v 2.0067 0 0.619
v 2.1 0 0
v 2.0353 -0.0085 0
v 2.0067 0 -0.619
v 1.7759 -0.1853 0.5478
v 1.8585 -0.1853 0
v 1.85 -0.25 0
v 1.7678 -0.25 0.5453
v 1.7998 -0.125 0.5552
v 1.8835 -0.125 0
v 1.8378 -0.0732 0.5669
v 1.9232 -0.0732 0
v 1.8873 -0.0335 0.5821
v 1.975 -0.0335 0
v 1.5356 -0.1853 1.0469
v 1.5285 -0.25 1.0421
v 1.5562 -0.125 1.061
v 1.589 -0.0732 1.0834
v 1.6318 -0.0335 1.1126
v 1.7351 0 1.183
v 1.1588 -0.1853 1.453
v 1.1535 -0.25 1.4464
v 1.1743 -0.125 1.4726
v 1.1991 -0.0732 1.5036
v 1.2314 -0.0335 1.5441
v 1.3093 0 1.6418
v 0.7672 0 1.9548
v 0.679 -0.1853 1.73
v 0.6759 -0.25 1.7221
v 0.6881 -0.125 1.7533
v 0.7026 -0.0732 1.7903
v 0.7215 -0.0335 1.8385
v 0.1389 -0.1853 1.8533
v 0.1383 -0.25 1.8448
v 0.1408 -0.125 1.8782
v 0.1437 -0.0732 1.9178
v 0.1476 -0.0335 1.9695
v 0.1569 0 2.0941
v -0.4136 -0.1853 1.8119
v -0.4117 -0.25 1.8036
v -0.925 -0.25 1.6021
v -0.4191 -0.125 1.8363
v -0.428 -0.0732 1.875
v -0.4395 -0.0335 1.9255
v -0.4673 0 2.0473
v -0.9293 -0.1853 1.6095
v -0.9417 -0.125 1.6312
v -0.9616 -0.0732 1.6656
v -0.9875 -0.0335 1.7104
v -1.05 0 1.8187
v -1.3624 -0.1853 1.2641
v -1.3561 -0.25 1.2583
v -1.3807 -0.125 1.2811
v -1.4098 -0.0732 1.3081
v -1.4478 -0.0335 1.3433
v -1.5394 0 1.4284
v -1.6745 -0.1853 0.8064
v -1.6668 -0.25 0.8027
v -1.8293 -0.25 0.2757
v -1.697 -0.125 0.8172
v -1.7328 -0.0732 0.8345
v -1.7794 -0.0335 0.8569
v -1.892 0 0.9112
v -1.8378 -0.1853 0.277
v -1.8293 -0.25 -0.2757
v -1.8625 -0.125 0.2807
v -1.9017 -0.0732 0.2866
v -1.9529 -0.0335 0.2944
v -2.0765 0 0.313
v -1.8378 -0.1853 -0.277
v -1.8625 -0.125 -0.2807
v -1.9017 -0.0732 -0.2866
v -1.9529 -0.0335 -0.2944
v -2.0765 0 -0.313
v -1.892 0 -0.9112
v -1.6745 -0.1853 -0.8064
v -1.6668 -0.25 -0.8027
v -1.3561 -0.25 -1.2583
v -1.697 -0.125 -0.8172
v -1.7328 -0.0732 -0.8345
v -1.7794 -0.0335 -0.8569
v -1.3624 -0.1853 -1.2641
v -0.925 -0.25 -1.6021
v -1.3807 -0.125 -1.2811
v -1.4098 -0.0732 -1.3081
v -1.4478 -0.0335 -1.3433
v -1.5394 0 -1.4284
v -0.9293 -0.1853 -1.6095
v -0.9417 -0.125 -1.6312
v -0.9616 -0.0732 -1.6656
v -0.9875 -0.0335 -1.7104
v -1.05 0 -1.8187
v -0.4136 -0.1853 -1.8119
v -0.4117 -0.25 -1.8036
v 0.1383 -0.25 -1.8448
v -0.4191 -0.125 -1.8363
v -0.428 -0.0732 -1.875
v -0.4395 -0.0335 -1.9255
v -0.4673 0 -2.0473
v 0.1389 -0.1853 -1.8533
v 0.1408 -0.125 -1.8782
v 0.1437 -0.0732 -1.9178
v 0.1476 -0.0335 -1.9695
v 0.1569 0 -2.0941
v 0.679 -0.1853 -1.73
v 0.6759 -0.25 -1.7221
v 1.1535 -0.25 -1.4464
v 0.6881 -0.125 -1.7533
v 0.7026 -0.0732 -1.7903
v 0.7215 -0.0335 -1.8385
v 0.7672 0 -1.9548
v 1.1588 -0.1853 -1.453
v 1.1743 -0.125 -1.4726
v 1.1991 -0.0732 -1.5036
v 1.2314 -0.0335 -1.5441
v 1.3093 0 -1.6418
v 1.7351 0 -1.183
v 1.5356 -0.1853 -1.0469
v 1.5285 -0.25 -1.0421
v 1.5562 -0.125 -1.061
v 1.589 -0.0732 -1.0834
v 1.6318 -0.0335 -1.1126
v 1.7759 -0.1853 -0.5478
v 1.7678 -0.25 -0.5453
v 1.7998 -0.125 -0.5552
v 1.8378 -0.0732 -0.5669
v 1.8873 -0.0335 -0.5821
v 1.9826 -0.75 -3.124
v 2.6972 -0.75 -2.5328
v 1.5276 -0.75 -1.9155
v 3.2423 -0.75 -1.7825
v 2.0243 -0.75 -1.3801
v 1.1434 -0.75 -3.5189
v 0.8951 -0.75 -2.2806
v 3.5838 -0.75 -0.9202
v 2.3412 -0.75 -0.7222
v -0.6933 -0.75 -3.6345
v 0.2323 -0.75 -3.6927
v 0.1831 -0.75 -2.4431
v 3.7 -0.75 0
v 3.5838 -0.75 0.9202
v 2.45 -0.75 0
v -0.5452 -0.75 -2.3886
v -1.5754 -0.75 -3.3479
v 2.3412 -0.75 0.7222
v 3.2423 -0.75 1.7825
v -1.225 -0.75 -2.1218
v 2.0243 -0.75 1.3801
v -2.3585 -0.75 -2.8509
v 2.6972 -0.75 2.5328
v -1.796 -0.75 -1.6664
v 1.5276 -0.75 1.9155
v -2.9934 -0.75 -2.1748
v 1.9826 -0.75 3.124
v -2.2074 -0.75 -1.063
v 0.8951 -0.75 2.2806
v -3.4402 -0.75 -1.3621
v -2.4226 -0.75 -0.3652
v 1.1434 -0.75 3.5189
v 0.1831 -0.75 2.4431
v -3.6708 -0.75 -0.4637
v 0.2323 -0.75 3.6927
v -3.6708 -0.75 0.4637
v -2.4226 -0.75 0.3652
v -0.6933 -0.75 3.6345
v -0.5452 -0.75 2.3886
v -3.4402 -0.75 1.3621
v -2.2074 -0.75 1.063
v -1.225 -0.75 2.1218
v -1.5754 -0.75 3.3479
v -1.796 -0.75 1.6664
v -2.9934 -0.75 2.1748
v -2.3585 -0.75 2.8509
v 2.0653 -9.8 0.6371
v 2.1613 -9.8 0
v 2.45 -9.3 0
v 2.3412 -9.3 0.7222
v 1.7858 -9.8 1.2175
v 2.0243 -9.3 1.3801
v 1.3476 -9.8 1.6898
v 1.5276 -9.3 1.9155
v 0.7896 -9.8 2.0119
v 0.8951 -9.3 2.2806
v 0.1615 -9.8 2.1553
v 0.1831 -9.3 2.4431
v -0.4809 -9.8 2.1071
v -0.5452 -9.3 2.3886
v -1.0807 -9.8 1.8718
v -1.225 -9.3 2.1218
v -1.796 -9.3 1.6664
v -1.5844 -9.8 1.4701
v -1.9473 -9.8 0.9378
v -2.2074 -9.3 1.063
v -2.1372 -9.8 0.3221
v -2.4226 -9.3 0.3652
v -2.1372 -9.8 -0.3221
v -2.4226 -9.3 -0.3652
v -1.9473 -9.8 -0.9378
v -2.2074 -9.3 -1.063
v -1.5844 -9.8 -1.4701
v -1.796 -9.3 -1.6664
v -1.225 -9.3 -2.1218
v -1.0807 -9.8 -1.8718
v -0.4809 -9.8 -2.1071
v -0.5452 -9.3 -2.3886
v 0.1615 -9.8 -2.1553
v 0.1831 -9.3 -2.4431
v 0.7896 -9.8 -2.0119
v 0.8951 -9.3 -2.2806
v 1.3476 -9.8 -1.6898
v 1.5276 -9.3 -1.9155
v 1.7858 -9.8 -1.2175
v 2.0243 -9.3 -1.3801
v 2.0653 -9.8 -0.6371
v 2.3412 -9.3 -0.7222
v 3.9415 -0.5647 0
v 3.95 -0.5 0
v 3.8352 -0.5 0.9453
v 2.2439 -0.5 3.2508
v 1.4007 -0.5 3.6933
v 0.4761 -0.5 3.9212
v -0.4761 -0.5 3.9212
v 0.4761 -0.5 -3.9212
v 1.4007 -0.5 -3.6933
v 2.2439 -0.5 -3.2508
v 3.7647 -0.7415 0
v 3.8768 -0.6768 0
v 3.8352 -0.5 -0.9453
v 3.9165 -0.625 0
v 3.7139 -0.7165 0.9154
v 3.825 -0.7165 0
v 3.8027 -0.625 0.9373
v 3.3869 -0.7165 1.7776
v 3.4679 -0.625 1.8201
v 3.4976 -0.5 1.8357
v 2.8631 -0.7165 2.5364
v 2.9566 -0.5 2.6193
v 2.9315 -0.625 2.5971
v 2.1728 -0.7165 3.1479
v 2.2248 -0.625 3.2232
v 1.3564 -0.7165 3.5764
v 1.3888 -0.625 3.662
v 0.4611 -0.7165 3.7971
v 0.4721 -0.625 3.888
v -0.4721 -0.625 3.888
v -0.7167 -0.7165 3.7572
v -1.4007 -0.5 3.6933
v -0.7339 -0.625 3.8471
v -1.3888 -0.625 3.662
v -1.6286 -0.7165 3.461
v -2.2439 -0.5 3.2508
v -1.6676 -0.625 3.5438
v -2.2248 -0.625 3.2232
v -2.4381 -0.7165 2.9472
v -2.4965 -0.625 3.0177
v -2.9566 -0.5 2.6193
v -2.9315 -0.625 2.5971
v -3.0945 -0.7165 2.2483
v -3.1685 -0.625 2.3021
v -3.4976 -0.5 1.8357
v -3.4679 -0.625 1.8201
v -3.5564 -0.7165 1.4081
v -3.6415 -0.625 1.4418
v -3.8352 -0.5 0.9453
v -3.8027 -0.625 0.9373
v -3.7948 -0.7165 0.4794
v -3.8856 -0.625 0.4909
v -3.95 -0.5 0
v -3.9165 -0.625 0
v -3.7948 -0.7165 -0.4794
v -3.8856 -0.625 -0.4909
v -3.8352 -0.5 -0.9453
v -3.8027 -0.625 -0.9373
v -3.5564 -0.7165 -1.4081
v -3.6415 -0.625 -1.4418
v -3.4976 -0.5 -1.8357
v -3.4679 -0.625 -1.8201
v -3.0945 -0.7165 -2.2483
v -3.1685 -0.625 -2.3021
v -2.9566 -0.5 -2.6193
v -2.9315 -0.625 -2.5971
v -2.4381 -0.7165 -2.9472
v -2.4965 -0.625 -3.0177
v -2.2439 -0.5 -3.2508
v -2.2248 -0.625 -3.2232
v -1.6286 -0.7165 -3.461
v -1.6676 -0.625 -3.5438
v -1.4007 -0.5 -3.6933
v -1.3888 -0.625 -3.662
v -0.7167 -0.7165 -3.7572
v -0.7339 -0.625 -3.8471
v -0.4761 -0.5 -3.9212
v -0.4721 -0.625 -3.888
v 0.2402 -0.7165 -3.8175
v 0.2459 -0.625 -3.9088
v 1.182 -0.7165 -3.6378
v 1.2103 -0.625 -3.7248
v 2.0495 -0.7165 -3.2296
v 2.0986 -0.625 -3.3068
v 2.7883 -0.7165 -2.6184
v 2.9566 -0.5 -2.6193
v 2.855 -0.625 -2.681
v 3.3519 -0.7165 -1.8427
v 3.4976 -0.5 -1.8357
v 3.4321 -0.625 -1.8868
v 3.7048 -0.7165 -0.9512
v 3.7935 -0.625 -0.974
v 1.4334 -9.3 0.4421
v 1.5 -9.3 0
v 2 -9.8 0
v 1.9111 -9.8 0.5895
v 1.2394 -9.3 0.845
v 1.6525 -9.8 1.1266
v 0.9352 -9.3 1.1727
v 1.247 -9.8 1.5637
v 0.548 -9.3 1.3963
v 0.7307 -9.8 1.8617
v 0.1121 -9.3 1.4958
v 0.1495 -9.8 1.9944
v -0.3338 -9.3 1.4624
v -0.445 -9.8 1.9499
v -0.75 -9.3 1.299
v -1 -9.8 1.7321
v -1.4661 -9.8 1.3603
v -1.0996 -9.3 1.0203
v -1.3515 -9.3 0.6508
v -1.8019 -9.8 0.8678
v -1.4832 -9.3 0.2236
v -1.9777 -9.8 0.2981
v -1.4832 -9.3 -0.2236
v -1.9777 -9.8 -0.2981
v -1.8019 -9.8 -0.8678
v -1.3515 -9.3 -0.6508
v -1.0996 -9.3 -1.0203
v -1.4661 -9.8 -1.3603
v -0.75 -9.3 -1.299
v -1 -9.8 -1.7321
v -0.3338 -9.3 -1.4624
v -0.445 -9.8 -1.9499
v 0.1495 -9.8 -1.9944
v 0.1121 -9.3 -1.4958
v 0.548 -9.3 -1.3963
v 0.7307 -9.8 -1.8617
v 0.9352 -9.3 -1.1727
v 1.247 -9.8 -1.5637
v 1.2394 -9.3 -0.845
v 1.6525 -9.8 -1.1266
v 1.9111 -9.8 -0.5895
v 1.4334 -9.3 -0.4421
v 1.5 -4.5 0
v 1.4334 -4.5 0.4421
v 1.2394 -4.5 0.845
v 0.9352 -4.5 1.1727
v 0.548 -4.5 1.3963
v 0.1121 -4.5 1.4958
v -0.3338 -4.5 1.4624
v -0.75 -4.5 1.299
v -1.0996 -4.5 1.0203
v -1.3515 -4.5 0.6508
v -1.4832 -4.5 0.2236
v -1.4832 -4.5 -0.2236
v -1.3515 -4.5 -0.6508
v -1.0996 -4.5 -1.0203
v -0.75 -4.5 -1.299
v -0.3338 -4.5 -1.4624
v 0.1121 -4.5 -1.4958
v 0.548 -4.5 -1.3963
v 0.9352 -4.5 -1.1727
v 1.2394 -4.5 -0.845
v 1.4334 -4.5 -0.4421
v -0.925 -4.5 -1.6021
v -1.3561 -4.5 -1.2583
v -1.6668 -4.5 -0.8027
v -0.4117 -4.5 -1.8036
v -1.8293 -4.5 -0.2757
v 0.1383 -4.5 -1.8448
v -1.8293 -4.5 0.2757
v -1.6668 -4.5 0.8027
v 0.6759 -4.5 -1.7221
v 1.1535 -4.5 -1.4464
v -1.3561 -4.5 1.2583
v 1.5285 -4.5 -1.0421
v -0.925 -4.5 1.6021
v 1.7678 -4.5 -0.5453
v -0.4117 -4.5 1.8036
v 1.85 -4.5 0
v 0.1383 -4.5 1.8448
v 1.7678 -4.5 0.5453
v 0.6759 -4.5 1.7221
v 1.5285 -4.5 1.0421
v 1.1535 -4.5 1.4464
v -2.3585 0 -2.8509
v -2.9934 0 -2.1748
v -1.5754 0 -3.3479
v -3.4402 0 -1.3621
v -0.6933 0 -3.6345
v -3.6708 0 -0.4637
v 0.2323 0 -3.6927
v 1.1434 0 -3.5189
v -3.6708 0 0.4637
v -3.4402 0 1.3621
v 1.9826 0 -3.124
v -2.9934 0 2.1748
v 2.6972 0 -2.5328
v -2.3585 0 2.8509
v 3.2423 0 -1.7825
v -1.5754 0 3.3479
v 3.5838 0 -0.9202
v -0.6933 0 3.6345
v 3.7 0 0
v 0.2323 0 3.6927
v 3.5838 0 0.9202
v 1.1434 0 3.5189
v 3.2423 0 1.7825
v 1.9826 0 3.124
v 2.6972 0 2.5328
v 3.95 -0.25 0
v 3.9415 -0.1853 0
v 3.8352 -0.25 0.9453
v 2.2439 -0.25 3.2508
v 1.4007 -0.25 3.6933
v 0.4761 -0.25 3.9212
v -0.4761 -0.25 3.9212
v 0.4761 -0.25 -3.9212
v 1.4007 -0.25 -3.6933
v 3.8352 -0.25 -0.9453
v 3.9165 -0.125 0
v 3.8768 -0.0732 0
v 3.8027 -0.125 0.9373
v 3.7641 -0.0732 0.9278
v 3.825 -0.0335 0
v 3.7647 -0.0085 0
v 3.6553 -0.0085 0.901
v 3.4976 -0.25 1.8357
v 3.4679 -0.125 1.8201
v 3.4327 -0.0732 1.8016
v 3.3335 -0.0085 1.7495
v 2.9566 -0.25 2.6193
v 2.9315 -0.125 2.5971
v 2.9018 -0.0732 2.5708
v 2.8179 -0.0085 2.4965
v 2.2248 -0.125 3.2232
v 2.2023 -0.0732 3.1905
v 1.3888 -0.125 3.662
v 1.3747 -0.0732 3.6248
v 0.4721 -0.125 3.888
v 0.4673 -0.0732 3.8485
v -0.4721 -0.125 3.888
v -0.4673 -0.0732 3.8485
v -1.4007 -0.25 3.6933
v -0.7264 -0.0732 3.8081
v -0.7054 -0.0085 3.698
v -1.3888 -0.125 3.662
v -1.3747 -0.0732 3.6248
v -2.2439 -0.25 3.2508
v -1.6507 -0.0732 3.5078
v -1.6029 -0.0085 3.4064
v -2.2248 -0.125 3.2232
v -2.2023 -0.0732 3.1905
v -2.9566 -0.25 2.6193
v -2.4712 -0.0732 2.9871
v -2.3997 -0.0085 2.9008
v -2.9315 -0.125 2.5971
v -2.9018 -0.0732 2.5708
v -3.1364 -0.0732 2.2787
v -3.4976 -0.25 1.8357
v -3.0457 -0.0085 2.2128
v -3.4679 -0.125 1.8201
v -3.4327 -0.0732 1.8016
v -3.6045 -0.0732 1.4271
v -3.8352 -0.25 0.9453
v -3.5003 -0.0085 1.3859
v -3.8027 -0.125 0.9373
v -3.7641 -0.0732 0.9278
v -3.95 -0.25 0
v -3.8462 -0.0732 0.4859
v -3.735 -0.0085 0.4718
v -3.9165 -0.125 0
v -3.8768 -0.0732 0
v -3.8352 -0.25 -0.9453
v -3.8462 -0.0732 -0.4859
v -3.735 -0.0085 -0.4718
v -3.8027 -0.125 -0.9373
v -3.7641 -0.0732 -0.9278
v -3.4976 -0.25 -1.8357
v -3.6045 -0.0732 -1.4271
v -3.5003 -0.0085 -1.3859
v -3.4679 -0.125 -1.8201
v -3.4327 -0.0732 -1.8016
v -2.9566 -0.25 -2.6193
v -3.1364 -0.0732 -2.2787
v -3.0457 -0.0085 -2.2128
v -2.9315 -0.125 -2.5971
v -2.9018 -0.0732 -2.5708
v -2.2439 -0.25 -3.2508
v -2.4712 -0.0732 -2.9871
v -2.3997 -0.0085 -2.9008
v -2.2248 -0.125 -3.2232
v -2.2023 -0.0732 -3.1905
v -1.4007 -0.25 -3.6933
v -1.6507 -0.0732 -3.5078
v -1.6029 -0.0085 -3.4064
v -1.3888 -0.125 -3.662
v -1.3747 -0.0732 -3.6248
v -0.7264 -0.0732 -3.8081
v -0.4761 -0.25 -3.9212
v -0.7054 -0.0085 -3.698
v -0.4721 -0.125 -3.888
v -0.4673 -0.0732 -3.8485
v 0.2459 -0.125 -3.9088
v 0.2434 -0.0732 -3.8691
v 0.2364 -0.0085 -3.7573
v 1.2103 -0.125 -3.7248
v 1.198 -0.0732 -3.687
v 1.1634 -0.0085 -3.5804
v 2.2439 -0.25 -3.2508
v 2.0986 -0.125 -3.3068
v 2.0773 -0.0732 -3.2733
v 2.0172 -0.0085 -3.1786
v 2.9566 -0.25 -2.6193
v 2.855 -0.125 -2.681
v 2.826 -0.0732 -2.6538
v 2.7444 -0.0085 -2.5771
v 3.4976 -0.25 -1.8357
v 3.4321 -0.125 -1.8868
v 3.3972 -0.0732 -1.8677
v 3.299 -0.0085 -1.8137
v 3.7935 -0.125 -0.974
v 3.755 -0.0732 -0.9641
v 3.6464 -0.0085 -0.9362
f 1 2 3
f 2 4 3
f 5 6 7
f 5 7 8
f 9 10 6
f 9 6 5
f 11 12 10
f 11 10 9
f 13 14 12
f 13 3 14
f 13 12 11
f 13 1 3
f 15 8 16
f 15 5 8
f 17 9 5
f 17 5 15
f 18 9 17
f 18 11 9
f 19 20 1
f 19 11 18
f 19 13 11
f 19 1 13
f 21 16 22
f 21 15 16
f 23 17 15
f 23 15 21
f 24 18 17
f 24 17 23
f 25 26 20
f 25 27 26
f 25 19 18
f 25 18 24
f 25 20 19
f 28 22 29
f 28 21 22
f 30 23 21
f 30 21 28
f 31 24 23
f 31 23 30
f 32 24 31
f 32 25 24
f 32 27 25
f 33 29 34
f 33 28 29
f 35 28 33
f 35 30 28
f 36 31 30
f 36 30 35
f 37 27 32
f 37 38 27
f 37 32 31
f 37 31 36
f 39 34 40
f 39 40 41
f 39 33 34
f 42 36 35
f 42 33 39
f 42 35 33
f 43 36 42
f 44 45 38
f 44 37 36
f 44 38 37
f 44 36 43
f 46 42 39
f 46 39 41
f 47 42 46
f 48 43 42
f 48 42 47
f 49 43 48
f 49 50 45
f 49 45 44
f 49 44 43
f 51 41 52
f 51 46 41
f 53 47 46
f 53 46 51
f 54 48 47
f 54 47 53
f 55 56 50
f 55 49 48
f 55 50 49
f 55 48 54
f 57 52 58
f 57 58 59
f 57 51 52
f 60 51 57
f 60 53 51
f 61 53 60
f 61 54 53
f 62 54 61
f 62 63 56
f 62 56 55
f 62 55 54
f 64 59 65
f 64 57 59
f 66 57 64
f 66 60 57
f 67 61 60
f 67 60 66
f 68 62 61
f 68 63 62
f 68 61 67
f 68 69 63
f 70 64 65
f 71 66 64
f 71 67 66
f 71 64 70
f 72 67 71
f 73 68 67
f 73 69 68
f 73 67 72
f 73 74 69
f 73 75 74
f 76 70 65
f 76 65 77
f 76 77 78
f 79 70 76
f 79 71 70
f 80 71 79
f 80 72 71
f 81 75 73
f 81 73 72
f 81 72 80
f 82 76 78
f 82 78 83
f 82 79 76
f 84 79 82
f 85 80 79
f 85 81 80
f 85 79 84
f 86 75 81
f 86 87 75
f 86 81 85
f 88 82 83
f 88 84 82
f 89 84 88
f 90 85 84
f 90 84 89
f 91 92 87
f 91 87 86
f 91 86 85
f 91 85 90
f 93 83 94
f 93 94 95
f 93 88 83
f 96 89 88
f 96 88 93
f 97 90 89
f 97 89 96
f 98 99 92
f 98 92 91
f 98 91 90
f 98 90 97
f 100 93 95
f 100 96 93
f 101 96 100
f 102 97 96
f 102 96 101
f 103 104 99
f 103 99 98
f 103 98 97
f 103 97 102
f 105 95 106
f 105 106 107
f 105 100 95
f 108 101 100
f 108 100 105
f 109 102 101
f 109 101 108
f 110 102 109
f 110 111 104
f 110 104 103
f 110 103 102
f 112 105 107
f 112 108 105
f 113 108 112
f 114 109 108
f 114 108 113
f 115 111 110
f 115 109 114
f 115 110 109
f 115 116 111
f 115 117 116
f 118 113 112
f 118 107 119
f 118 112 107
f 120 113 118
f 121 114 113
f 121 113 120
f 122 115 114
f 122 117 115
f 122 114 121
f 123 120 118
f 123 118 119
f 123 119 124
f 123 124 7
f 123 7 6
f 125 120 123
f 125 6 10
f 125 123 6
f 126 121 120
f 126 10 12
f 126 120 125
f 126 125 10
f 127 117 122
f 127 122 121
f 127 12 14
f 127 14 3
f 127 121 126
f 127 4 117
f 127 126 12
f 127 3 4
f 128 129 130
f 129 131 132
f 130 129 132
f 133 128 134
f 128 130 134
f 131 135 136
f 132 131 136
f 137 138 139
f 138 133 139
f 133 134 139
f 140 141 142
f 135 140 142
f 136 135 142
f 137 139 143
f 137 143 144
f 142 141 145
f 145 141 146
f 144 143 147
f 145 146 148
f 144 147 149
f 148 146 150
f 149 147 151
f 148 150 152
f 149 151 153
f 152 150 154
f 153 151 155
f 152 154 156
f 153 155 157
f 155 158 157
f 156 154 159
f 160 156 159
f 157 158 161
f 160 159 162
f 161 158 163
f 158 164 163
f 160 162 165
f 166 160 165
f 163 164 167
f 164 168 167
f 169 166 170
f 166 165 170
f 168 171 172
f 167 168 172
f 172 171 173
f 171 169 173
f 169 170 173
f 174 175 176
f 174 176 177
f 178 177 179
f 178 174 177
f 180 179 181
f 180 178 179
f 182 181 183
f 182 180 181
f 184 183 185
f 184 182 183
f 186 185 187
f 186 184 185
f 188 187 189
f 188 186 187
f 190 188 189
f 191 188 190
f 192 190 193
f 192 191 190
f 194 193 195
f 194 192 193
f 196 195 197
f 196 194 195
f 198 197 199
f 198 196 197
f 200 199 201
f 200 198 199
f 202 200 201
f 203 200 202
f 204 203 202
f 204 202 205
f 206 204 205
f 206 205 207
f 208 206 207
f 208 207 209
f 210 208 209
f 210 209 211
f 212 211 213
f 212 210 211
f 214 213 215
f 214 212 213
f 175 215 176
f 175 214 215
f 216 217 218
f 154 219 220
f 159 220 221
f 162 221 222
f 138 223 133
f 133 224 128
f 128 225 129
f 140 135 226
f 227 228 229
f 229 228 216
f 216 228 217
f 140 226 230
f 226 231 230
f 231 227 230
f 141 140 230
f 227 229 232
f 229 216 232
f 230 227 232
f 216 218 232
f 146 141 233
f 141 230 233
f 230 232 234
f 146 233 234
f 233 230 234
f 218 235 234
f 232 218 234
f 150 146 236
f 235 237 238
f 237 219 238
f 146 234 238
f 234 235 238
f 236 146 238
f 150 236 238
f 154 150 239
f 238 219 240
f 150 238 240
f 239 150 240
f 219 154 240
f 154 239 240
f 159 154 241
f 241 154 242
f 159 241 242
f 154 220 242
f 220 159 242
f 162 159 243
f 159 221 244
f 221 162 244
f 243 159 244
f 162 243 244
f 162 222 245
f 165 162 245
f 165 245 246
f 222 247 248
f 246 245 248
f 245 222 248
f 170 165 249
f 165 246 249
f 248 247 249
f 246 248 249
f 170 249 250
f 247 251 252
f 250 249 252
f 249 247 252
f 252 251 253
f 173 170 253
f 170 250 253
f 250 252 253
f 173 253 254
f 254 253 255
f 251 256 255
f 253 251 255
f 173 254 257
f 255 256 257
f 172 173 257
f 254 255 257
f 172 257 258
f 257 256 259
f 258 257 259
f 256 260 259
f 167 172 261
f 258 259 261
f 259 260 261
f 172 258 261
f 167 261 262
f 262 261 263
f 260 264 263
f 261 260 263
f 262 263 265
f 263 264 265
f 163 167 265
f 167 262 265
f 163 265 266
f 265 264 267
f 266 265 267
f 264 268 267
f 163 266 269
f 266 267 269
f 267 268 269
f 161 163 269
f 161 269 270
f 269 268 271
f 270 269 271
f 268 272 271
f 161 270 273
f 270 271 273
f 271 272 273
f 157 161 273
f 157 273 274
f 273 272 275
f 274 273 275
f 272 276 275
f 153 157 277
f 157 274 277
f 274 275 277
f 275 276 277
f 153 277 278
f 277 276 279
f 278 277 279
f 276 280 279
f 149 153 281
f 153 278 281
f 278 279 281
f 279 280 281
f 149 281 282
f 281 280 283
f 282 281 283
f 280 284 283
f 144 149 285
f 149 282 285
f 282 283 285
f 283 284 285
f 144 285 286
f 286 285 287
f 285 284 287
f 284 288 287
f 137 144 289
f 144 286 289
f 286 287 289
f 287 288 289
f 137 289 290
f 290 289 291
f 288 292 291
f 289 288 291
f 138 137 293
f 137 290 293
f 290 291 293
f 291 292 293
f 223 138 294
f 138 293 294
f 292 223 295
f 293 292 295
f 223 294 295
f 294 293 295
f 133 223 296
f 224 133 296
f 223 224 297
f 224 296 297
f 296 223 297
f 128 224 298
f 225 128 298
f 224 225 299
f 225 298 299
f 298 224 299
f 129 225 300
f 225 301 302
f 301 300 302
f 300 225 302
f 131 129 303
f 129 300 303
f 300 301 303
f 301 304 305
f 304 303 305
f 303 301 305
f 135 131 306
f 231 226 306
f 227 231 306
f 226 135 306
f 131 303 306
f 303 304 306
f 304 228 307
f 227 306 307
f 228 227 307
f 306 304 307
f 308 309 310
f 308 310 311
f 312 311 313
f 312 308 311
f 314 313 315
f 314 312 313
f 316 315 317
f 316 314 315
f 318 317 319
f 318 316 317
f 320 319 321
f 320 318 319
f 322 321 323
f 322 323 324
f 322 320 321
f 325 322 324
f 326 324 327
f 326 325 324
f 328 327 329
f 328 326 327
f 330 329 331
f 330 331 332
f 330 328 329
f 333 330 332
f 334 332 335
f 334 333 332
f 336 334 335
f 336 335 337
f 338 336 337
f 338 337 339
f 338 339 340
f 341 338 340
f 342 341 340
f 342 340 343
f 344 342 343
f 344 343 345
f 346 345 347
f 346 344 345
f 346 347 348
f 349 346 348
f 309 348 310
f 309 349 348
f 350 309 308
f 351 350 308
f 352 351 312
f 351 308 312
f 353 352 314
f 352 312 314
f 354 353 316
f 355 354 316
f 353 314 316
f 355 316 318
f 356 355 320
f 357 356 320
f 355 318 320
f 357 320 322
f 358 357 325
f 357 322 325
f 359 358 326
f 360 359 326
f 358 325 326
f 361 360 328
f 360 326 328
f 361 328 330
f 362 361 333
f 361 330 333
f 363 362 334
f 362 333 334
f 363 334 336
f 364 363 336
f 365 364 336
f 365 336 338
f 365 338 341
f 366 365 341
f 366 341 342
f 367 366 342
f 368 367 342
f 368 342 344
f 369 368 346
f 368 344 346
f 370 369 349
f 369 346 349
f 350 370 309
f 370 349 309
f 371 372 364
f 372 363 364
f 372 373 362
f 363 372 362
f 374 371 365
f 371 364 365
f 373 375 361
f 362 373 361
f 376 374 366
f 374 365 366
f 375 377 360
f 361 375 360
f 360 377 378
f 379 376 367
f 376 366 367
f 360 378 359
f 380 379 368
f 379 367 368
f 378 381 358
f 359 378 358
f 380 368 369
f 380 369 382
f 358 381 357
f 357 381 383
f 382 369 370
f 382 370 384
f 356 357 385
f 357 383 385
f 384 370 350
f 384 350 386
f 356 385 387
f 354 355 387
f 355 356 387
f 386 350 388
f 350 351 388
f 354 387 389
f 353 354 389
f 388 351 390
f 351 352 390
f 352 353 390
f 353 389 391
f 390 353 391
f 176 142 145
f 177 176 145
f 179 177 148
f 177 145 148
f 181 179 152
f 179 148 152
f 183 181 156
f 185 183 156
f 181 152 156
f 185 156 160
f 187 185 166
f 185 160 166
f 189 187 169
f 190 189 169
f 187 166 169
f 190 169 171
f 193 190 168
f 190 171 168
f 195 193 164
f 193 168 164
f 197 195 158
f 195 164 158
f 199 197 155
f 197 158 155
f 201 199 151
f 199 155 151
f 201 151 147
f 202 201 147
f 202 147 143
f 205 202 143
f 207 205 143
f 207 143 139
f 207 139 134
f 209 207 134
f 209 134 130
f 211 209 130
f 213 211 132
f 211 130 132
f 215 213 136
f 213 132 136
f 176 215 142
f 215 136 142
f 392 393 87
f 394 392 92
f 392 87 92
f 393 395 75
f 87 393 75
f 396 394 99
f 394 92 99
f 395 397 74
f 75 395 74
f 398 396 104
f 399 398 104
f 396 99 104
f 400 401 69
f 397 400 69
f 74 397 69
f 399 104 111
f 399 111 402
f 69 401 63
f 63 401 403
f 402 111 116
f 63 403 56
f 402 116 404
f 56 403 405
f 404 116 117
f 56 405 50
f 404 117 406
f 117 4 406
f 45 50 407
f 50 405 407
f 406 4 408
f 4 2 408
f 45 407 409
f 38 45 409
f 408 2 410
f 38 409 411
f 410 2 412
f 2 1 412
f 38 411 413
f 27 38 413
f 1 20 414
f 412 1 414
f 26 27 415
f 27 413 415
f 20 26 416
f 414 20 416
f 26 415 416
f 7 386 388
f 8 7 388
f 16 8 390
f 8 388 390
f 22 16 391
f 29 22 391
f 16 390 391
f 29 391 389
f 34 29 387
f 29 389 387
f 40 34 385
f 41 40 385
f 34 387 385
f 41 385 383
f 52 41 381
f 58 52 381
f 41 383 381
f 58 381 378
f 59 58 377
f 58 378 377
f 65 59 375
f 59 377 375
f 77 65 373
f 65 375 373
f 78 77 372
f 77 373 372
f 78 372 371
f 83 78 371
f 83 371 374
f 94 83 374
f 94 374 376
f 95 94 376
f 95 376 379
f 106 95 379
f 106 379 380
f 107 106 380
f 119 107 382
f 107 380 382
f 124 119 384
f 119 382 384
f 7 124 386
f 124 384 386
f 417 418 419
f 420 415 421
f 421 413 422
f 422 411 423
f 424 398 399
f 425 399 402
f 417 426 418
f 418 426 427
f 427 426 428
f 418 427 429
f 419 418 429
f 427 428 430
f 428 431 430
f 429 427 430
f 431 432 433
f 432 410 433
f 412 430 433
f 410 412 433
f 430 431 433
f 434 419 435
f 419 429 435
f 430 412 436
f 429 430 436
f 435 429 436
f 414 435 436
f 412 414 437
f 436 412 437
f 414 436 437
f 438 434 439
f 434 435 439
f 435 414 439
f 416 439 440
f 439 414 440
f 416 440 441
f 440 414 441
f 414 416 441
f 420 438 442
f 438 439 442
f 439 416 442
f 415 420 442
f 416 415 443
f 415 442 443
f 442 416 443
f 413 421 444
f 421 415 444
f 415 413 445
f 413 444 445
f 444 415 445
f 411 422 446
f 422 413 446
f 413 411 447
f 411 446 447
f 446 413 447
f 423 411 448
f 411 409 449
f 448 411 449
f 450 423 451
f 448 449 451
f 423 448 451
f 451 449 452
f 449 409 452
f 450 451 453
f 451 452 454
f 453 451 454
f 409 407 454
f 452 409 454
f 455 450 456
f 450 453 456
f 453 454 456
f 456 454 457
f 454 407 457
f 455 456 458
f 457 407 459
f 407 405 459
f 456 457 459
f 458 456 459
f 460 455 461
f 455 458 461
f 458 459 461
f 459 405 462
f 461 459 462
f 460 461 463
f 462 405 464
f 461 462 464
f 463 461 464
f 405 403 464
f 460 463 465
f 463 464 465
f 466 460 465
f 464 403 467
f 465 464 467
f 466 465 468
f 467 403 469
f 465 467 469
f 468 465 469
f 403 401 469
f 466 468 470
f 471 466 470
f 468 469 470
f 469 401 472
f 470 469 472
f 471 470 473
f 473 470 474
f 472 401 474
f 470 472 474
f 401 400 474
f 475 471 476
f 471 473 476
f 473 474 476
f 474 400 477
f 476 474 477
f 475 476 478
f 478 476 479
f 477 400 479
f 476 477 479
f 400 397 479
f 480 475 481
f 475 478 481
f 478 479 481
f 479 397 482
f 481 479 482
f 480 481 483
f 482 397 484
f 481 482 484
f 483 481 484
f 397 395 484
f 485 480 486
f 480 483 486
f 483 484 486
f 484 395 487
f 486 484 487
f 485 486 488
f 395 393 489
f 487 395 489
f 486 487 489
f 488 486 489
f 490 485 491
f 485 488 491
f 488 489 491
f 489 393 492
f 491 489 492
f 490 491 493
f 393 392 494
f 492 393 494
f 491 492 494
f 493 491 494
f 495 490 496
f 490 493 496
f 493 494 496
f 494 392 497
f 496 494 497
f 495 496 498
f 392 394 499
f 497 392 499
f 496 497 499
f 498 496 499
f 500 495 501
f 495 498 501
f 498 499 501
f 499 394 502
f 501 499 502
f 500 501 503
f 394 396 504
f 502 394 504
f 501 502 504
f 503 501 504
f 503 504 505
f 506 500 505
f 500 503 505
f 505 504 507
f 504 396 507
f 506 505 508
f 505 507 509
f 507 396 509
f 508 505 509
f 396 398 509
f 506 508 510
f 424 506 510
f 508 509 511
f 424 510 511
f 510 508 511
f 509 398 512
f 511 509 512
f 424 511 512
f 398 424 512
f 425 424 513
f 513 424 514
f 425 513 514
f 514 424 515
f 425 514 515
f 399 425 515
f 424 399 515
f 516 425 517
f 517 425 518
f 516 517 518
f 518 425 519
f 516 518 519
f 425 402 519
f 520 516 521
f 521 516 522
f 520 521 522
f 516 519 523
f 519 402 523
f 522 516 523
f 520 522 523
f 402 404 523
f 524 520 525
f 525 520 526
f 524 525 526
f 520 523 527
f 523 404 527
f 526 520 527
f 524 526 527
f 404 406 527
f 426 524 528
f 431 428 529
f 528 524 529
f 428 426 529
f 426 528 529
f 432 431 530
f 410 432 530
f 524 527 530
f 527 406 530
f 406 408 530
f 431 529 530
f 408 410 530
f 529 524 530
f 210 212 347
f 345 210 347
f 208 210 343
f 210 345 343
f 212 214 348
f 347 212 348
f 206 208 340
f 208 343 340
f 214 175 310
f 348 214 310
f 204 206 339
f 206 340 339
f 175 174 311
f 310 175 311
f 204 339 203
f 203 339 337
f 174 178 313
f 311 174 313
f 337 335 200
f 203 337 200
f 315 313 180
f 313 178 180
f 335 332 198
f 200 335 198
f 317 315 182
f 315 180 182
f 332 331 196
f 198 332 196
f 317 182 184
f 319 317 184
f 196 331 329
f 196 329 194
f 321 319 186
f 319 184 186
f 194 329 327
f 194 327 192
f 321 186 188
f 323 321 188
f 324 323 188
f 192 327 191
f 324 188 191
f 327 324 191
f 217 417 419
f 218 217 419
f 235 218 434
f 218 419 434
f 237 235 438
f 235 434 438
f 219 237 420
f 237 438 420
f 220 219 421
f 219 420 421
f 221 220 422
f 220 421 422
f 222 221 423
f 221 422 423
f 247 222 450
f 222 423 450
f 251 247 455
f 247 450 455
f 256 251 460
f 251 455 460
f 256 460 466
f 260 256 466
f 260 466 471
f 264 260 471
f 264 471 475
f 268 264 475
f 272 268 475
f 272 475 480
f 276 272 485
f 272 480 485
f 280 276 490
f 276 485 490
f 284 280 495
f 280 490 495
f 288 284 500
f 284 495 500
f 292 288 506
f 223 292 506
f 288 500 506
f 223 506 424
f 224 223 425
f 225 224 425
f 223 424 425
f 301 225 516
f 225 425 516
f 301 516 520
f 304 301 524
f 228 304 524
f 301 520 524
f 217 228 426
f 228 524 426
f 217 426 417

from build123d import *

# Parameters (mm, degrees)
FILLET1_R      = 0.25
CHAMFER1_SIZE  = 0.5
CHAMFER1_SIZE2 = 0.288675135
CHAMFER2_SIZE  = 0.5


with BuildPart() as part:
    # Sketch1 → Revolve1 (revolve)
    with BuildSketch(Plane.XY):
        Polygon((1.85, 0), (1.85, -4.5), (1.5, -4.5), (1.5, -9.8), (2.45, -9.8), (2.45, -0.75), (3.95, -0.75), (3.95, 0), align=None)
    revolve(axis=Axis((0, 0, 0), (0, -1, 0)))

    # Fillet1
    fillet1_edges = [part.edges().sort_by_distance(p)[0] for p in [
        (-3.95, 0, 0),
        (-3.95, -0.75, 0),
        (-1.85, 0, 0),
    ]]
    fillet(fillet1_edges, radius=FILLET1_R)

    # Chamfer1
    chamfer1_edges = [part.edges().sort_by_distance(p)[0] for p in [
        (-2.45, -9.8, 0),
    ]]
    chamfer1_side = [part.faces().sort_by_distance(p)[0] for p in [
        (-2.45, -5.275, 0),
    ]]
    chamfer(chamfer1_edges, length=CHAMFER1_SIZE, length2=CHAMFER1_SIZE2, reference=chamfer1_side[0])

    # Chamfer2
    chamfer2_edges = [part.edges().sort_by_distance(p)[0] for p in [
        (-1.5, -9.8, 0),
    ]]
    chamfer(chamfer2_edges, length=CHAMFER2_SIZE)


solid = part.part
